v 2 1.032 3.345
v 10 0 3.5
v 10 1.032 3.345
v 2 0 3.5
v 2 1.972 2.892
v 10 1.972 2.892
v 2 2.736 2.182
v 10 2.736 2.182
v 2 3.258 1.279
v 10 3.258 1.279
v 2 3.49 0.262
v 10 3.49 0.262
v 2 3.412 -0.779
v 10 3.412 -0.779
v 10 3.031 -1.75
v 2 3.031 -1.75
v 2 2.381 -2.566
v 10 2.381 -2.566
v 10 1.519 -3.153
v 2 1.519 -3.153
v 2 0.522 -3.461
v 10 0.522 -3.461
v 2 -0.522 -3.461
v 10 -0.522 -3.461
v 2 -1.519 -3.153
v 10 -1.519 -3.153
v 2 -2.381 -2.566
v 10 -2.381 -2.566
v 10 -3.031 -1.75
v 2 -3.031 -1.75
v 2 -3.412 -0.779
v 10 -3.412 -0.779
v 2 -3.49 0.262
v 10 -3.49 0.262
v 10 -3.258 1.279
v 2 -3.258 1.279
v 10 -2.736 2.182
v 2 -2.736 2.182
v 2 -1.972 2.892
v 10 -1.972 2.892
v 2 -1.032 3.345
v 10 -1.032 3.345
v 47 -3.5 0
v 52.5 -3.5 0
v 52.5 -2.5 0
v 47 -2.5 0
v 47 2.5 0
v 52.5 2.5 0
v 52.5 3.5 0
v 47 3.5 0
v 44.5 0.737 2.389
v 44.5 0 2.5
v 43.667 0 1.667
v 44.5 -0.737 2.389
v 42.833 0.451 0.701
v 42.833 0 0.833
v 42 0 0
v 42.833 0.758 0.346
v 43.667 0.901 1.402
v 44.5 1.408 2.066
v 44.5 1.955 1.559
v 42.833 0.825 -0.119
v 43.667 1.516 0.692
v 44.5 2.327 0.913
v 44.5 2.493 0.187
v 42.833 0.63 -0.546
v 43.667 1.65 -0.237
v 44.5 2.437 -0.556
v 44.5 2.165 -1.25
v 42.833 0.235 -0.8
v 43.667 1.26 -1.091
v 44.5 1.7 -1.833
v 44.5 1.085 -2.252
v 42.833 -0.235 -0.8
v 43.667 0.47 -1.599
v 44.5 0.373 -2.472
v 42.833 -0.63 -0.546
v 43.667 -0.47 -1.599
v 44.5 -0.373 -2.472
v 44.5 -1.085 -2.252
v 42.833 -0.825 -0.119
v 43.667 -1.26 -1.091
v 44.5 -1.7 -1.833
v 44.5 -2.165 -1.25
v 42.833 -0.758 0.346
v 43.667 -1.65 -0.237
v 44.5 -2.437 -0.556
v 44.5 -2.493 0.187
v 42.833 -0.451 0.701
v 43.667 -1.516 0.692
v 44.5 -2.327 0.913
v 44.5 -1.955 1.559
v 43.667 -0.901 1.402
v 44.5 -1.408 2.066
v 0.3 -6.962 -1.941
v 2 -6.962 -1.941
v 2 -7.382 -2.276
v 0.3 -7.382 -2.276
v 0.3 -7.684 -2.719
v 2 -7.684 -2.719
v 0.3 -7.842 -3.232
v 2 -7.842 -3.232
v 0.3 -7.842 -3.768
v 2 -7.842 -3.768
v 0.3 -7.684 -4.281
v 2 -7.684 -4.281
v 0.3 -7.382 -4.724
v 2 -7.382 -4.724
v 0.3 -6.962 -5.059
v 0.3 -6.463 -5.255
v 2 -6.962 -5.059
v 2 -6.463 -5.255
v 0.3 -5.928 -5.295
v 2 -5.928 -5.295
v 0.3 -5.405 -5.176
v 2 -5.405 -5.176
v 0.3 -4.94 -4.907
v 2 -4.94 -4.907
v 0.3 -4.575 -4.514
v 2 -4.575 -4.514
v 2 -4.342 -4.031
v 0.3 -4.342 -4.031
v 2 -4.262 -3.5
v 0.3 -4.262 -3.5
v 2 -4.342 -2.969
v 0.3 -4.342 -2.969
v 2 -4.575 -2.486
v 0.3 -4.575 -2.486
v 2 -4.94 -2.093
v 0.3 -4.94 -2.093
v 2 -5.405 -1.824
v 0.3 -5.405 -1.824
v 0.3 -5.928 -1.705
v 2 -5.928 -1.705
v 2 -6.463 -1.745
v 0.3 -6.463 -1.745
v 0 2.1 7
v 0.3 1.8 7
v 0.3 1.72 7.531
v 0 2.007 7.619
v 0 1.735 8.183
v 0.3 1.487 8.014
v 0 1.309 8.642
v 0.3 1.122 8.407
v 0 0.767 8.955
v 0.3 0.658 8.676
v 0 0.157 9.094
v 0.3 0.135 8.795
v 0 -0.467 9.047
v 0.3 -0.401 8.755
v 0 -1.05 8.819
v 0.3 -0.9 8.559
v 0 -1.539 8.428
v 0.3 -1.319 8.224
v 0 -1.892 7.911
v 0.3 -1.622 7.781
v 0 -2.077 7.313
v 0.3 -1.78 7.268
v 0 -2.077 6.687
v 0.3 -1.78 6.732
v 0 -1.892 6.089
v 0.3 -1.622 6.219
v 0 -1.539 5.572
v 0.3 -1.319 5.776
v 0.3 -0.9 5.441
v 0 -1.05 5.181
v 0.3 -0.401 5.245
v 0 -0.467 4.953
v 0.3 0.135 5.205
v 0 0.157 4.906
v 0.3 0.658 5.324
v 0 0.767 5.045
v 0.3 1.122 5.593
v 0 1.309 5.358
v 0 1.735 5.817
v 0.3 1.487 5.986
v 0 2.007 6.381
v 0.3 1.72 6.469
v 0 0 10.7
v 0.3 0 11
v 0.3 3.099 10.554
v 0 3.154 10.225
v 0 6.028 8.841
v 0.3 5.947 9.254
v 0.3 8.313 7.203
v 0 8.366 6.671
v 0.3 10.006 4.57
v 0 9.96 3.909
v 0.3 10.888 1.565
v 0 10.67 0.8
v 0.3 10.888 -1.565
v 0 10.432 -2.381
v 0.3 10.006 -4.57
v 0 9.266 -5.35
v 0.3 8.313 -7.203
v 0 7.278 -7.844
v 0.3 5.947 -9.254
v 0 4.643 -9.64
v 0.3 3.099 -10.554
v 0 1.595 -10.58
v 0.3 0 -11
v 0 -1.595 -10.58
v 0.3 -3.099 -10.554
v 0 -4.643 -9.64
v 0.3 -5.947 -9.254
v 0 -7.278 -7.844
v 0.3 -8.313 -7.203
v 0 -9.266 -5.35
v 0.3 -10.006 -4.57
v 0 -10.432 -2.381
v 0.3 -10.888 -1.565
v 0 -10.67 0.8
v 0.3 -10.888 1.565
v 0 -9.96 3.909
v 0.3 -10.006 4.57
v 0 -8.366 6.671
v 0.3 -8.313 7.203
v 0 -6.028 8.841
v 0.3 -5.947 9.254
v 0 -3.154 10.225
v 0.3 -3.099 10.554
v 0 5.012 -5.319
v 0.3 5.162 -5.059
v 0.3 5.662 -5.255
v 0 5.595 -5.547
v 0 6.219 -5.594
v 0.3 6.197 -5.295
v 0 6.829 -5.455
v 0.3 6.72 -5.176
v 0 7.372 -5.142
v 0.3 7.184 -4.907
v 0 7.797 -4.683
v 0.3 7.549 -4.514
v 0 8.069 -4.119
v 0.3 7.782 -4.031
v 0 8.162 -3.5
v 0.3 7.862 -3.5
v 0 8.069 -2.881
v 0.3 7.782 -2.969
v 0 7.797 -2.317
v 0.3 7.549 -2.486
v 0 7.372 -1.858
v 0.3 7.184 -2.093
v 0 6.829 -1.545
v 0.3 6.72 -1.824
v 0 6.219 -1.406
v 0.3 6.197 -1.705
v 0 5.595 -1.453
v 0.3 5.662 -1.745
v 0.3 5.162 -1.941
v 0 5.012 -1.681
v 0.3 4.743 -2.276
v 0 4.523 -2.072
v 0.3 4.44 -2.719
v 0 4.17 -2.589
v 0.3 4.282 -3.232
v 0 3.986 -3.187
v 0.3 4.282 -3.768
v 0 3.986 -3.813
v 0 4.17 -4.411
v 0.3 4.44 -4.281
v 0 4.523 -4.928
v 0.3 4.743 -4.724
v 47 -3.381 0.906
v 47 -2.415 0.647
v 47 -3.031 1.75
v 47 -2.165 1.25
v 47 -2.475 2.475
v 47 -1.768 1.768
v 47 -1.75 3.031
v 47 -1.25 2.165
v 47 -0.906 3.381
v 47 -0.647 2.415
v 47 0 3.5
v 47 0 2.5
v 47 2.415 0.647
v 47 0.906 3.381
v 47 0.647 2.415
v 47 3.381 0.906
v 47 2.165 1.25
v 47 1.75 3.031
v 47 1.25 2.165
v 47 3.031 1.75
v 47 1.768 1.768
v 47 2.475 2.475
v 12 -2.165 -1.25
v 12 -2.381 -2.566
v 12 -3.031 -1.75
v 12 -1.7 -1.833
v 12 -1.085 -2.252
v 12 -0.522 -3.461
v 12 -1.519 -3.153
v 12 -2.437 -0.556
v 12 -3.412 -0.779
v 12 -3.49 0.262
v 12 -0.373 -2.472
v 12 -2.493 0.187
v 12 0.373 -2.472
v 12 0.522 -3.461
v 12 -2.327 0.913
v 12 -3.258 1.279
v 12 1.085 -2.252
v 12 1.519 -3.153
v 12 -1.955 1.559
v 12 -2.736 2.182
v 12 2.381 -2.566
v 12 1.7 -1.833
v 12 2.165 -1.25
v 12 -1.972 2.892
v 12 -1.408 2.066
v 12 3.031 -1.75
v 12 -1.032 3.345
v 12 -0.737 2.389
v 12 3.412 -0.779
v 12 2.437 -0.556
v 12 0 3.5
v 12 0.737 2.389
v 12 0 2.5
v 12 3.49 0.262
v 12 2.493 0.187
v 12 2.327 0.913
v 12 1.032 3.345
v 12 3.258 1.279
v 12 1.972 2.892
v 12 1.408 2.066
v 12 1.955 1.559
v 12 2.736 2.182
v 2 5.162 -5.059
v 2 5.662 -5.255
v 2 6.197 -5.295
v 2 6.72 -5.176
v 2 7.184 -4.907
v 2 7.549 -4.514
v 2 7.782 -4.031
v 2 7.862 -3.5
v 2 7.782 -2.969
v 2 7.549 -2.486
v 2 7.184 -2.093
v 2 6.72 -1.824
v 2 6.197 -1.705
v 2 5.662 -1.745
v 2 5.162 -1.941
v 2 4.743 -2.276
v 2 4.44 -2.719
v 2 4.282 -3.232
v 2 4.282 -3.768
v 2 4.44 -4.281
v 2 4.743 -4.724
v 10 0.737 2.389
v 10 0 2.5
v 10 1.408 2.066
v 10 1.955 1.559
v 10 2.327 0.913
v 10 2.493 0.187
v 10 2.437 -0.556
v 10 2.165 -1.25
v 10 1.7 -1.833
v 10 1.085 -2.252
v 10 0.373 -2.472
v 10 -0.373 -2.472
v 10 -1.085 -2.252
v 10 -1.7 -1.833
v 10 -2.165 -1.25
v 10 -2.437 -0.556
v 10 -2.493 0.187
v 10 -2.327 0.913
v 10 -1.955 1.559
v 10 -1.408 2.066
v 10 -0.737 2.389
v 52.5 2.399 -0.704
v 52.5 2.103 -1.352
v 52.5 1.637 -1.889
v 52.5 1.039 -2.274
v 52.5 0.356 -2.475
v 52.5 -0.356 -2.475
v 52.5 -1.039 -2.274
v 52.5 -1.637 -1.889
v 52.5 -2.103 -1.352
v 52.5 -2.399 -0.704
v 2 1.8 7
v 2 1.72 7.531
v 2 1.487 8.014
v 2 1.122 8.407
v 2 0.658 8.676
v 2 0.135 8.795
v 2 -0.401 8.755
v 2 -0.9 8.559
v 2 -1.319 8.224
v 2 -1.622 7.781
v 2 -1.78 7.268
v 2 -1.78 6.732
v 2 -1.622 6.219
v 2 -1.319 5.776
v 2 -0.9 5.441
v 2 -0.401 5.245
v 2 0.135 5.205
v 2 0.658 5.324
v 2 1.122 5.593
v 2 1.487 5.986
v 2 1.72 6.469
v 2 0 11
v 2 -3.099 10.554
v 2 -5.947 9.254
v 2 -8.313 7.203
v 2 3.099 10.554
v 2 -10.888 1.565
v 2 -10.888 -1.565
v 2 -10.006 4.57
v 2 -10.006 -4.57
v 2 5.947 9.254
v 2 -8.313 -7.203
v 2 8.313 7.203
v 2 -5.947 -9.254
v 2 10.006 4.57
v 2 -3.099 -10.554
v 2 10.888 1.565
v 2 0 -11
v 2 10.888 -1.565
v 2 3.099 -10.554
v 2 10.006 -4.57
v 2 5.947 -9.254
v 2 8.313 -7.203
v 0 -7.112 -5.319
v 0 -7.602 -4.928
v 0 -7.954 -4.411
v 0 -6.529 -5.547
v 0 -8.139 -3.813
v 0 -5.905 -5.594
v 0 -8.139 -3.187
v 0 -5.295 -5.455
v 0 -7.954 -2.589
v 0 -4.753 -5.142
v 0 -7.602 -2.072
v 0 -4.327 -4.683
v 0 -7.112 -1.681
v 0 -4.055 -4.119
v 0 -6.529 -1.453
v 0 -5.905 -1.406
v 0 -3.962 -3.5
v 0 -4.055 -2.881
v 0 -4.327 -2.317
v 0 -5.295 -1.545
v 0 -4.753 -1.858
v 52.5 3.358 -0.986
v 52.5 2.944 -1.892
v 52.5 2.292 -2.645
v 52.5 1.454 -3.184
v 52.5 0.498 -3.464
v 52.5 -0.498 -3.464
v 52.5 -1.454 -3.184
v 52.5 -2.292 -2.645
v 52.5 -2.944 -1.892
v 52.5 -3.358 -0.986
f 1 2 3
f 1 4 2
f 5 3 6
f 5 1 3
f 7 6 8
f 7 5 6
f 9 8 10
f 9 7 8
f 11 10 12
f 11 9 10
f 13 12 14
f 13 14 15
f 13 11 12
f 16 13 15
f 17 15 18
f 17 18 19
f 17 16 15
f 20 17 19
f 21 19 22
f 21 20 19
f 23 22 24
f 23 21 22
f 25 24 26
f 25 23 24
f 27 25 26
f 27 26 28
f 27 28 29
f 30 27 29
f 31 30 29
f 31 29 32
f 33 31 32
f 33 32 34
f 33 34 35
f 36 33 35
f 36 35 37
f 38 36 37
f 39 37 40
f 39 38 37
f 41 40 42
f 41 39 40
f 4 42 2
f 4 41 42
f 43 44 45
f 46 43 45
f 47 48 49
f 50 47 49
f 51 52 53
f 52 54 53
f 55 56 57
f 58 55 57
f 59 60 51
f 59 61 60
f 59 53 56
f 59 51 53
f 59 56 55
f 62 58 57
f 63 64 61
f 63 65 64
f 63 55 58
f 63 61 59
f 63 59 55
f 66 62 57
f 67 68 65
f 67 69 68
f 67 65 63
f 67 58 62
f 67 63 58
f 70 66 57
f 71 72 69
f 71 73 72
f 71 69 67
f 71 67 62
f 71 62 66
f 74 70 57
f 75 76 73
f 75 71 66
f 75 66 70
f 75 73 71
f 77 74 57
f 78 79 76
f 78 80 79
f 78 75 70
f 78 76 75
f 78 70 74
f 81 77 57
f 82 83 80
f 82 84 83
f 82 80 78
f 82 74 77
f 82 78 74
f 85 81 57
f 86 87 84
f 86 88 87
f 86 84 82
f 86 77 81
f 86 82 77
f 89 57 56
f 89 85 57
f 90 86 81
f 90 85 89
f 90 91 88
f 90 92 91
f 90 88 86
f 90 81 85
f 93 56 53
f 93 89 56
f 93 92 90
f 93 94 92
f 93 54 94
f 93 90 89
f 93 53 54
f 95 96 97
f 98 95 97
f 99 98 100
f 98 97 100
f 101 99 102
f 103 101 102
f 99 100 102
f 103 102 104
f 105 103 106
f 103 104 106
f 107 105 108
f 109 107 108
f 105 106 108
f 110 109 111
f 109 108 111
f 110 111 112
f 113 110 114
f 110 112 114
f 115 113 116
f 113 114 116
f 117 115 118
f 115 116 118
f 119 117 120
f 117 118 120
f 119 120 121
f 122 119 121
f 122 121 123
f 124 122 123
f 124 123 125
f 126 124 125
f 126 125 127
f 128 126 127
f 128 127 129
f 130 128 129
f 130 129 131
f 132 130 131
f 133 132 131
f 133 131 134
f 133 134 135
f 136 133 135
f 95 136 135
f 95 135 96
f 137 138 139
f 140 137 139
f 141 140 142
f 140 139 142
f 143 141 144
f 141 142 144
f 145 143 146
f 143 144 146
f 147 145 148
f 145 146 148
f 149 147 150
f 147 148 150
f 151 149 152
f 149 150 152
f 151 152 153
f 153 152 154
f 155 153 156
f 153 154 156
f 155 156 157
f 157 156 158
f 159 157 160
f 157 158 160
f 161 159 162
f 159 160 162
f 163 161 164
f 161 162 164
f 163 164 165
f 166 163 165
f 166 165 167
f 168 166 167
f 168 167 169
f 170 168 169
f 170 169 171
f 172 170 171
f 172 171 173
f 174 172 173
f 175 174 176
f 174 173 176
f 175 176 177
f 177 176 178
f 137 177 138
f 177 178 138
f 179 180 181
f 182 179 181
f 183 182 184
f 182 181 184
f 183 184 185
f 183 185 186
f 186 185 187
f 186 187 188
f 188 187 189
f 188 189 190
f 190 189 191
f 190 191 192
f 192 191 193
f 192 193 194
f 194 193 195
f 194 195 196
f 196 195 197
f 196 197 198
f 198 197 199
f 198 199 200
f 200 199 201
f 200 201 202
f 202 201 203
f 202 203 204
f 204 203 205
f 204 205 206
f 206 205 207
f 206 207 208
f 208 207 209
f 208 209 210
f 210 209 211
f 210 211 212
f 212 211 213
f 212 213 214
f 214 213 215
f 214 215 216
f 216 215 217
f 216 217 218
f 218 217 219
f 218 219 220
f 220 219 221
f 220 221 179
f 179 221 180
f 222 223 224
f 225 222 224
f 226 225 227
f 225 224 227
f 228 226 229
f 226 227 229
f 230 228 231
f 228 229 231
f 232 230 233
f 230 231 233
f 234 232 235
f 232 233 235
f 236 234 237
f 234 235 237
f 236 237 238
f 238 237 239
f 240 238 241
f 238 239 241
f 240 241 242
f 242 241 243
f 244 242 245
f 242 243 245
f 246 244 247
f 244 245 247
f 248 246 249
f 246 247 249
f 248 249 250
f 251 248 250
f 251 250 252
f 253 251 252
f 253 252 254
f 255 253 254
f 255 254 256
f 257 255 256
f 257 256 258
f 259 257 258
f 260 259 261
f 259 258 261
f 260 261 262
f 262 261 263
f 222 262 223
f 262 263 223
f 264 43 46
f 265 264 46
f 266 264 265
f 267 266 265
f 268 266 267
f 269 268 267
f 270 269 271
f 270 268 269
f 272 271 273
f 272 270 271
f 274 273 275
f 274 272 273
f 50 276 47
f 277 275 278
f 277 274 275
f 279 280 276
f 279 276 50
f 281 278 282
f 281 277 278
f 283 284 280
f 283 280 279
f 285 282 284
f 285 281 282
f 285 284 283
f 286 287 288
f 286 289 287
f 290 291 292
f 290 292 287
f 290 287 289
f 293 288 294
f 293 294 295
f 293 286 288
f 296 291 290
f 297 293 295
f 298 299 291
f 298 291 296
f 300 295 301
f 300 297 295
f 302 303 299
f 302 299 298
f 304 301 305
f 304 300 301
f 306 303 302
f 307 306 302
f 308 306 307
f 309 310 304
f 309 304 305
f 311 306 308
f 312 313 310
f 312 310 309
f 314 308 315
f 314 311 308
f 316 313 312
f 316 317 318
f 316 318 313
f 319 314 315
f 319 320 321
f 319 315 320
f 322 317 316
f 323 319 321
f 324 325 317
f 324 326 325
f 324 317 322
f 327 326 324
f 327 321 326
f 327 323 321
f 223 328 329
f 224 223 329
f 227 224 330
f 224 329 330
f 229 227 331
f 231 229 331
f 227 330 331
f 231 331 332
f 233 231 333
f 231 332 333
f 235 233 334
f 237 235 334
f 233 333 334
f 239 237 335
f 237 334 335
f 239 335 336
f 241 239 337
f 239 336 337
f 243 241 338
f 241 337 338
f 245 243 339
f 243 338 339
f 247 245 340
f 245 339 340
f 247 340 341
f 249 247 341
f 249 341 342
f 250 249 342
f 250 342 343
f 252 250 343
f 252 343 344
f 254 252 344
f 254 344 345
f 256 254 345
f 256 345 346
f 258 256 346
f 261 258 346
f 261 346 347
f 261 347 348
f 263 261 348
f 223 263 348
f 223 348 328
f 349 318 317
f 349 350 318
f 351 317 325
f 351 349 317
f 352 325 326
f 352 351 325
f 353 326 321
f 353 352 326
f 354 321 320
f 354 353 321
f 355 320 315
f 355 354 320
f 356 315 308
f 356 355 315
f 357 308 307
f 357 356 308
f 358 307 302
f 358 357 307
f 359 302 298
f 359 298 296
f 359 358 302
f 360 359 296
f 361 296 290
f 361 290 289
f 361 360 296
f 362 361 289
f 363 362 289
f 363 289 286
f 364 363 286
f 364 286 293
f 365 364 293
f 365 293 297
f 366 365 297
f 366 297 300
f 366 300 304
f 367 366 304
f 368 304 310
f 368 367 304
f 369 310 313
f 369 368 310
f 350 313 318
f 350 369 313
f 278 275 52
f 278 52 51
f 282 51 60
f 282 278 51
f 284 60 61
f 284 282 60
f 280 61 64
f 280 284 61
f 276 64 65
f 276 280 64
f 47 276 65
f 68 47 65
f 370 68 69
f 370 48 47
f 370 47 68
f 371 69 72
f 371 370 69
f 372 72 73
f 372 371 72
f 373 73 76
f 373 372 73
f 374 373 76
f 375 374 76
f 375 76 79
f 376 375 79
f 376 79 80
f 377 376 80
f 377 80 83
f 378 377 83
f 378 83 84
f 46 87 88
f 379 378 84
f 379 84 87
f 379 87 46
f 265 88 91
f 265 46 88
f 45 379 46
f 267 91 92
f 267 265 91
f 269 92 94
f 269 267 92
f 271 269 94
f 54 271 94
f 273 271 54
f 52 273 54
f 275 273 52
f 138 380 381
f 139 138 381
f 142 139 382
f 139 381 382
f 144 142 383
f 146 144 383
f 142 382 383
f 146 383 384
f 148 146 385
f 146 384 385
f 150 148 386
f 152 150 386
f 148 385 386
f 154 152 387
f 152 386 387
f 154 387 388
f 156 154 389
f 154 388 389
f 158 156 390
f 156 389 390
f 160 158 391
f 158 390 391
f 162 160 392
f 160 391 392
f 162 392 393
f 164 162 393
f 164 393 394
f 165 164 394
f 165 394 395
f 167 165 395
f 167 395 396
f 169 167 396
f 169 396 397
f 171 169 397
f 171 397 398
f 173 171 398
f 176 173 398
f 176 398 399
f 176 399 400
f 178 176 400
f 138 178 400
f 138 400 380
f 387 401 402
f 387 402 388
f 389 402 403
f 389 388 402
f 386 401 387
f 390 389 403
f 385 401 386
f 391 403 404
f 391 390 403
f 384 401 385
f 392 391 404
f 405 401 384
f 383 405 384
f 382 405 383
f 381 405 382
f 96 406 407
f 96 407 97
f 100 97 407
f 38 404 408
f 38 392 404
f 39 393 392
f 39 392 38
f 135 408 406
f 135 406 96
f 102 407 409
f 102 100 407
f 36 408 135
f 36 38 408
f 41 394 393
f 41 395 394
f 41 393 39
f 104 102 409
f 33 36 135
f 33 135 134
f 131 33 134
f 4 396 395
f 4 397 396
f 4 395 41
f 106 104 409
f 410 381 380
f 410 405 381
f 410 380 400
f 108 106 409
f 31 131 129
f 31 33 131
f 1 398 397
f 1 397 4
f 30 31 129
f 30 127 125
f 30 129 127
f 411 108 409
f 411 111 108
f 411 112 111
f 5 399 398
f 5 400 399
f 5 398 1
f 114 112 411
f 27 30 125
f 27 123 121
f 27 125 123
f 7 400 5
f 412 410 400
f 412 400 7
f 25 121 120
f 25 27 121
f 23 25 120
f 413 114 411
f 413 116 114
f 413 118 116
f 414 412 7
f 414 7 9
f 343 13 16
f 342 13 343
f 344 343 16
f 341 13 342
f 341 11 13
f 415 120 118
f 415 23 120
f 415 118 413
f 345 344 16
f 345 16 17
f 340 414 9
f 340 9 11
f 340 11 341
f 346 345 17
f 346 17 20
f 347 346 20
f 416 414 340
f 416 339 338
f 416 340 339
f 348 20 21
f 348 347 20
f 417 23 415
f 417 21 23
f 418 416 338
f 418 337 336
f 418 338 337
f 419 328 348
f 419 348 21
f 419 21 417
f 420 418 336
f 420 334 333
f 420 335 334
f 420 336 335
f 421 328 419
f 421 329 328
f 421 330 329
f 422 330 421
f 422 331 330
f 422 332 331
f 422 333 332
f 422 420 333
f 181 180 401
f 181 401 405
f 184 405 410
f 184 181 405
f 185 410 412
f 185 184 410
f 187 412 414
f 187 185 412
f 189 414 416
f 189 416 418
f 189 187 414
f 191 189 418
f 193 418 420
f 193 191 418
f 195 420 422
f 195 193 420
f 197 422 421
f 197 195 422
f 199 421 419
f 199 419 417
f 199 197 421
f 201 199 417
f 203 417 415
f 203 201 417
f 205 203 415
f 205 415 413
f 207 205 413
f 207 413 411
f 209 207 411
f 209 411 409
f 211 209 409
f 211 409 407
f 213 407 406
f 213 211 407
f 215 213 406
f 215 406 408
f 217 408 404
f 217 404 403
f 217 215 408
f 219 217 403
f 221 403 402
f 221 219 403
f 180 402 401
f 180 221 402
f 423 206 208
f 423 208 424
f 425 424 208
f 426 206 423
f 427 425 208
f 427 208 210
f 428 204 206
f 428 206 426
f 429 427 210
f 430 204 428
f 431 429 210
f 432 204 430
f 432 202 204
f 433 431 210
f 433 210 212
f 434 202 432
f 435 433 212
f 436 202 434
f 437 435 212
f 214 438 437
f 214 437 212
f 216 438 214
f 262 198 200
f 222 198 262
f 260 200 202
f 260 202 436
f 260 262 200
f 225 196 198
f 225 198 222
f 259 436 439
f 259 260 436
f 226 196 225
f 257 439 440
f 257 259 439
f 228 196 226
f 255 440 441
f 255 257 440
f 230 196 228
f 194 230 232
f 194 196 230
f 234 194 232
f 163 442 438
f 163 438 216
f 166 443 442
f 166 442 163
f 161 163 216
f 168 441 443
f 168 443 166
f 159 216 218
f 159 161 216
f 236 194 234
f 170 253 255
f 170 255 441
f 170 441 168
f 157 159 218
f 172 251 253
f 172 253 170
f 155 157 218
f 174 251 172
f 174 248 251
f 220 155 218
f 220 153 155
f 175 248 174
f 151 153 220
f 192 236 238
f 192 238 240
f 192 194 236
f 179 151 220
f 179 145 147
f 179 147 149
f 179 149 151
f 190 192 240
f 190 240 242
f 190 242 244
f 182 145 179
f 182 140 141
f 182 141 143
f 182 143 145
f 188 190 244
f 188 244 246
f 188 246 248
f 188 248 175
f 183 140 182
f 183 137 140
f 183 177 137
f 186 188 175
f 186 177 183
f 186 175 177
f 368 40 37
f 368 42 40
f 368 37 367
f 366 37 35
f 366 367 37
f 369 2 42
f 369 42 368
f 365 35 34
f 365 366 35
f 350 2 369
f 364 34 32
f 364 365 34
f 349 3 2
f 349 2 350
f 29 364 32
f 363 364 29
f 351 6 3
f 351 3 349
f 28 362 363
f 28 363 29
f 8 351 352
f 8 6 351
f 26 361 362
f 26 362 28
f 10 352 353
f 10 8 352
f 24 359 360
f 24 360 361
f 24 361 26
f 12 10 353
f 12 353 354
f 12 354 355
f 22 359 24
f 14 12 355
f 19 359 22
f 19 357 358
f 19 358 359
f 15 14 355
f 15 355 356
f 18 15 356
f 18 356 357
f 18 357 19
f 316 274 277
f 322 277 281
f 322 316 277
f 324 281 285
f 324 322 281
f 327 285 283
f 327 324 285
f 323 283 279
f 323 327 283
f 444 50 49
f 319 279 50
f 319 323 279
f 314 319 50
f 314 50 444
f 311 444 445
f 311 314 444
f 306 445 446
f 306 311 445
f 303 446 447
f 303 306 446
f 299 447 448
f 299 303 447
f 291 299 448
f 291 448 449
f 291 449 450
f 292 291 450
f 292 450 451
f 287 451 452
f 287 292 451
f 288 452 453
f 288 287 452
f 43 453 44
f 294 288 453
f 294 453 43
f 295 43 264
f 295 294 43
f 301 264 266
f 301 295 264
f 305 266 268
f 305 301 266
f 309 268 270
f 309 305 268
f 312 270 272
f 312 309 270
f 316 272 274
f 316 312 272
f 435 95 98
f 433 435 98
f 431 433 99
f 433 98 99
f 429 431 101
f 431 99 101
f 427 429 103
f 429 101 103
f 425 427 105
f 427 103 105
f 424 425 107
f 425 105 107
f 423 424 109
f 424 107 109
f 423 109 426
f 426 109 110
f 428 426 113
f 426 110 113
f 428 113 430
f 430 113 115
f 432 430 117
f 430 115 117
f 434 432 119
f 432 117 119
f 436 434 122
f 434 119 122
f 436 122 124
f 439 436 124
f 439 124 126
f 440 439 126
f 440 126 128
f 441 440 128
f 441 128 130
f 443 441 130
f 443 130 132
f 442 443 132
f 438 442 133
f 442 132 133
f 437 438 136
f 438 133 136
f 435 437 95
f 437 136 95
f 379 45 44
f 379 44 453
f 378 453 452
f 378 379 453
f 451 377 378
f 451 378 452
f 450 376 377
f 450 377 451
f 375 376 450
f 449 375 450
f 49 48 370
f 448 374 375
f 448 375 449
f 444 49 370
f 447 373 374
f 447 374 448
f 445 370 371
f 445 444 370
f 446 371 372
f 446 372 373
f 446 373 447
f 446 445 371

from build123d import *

# Parameters (mm, degrees)
F3_DEPTH        = 5.5
F5_D            = 3.6
F5_COPIES_COUNT = 3
F6_SIZE         = 0.3


# Not quite as in the source:
# - a pattern or mirror of a feature is missing from the dataset's text; its kind, count and spacing are read off the source's solid


with BuildPart() as f1:
    # F0 (on Front) → F1 (revolve)
    with BuildSketch(Plane.XZ):
        Polygon((0, 11), (0, 0), (42, 0), (44.5, 2.5), (52.5, 2.5), (52.5, 3.5), (12, 3.5), (12, 2.5), (10, 2.5), (10, 3.5), (2, 3.5), (2, 11), align=None)
    revolve(axis=Axis((21, 0, 0), (-1, 0, 0)))

    # F2 (on face) → F3 (cut)
    with BuildSketch(Plane.YZ.offset(52.5)):
        with BuildLine():
            Line((2.5, 0), (3.5, 0))
            ThreePointArc((3.5, 0), (0, 3.5), (-3.5, 0))
            Line((-3.5, 0), (-2.5, 0))
            ThreePointArc((-2.5, 0), (0, 2.5), (2.5, 0))
        make_face()
    extrude(amount=-F3_DEPTH, mode=Mode.SUBTRACT)

    # F5 (through all)
    with Locations(Plane(origin=(0, 0, 0), x_dir=(0, -1, 0), z_dir=(-1, 0, 0))):
        with Locations((0, 7)):
            f5 = Hole(F5_D / 2)

    # F5_copies: F5 ×3 about axis
    f5_copies_axis = Axis((0, 0, 0), (1, 0, 0))
    for i in range(1, F5_COPIES_COUNT):
        add(f5.rotate(f5_copies_axis, i * 360 / F5_COPIES_COUNT), mode=Mode.SUBTRACT)

    # F6
    f6_edges = [f1.edges().sort_by_distance(p)[0] for p in [
        (0, 0, -11),
        (0, -6.962178, -1.941154),
        (0, 5.162178, -5.058846),
        (0, 1.8, 7),
    ]]
    chamfer(f6_edges, length=F6_SIZE)


solid = f1.part
